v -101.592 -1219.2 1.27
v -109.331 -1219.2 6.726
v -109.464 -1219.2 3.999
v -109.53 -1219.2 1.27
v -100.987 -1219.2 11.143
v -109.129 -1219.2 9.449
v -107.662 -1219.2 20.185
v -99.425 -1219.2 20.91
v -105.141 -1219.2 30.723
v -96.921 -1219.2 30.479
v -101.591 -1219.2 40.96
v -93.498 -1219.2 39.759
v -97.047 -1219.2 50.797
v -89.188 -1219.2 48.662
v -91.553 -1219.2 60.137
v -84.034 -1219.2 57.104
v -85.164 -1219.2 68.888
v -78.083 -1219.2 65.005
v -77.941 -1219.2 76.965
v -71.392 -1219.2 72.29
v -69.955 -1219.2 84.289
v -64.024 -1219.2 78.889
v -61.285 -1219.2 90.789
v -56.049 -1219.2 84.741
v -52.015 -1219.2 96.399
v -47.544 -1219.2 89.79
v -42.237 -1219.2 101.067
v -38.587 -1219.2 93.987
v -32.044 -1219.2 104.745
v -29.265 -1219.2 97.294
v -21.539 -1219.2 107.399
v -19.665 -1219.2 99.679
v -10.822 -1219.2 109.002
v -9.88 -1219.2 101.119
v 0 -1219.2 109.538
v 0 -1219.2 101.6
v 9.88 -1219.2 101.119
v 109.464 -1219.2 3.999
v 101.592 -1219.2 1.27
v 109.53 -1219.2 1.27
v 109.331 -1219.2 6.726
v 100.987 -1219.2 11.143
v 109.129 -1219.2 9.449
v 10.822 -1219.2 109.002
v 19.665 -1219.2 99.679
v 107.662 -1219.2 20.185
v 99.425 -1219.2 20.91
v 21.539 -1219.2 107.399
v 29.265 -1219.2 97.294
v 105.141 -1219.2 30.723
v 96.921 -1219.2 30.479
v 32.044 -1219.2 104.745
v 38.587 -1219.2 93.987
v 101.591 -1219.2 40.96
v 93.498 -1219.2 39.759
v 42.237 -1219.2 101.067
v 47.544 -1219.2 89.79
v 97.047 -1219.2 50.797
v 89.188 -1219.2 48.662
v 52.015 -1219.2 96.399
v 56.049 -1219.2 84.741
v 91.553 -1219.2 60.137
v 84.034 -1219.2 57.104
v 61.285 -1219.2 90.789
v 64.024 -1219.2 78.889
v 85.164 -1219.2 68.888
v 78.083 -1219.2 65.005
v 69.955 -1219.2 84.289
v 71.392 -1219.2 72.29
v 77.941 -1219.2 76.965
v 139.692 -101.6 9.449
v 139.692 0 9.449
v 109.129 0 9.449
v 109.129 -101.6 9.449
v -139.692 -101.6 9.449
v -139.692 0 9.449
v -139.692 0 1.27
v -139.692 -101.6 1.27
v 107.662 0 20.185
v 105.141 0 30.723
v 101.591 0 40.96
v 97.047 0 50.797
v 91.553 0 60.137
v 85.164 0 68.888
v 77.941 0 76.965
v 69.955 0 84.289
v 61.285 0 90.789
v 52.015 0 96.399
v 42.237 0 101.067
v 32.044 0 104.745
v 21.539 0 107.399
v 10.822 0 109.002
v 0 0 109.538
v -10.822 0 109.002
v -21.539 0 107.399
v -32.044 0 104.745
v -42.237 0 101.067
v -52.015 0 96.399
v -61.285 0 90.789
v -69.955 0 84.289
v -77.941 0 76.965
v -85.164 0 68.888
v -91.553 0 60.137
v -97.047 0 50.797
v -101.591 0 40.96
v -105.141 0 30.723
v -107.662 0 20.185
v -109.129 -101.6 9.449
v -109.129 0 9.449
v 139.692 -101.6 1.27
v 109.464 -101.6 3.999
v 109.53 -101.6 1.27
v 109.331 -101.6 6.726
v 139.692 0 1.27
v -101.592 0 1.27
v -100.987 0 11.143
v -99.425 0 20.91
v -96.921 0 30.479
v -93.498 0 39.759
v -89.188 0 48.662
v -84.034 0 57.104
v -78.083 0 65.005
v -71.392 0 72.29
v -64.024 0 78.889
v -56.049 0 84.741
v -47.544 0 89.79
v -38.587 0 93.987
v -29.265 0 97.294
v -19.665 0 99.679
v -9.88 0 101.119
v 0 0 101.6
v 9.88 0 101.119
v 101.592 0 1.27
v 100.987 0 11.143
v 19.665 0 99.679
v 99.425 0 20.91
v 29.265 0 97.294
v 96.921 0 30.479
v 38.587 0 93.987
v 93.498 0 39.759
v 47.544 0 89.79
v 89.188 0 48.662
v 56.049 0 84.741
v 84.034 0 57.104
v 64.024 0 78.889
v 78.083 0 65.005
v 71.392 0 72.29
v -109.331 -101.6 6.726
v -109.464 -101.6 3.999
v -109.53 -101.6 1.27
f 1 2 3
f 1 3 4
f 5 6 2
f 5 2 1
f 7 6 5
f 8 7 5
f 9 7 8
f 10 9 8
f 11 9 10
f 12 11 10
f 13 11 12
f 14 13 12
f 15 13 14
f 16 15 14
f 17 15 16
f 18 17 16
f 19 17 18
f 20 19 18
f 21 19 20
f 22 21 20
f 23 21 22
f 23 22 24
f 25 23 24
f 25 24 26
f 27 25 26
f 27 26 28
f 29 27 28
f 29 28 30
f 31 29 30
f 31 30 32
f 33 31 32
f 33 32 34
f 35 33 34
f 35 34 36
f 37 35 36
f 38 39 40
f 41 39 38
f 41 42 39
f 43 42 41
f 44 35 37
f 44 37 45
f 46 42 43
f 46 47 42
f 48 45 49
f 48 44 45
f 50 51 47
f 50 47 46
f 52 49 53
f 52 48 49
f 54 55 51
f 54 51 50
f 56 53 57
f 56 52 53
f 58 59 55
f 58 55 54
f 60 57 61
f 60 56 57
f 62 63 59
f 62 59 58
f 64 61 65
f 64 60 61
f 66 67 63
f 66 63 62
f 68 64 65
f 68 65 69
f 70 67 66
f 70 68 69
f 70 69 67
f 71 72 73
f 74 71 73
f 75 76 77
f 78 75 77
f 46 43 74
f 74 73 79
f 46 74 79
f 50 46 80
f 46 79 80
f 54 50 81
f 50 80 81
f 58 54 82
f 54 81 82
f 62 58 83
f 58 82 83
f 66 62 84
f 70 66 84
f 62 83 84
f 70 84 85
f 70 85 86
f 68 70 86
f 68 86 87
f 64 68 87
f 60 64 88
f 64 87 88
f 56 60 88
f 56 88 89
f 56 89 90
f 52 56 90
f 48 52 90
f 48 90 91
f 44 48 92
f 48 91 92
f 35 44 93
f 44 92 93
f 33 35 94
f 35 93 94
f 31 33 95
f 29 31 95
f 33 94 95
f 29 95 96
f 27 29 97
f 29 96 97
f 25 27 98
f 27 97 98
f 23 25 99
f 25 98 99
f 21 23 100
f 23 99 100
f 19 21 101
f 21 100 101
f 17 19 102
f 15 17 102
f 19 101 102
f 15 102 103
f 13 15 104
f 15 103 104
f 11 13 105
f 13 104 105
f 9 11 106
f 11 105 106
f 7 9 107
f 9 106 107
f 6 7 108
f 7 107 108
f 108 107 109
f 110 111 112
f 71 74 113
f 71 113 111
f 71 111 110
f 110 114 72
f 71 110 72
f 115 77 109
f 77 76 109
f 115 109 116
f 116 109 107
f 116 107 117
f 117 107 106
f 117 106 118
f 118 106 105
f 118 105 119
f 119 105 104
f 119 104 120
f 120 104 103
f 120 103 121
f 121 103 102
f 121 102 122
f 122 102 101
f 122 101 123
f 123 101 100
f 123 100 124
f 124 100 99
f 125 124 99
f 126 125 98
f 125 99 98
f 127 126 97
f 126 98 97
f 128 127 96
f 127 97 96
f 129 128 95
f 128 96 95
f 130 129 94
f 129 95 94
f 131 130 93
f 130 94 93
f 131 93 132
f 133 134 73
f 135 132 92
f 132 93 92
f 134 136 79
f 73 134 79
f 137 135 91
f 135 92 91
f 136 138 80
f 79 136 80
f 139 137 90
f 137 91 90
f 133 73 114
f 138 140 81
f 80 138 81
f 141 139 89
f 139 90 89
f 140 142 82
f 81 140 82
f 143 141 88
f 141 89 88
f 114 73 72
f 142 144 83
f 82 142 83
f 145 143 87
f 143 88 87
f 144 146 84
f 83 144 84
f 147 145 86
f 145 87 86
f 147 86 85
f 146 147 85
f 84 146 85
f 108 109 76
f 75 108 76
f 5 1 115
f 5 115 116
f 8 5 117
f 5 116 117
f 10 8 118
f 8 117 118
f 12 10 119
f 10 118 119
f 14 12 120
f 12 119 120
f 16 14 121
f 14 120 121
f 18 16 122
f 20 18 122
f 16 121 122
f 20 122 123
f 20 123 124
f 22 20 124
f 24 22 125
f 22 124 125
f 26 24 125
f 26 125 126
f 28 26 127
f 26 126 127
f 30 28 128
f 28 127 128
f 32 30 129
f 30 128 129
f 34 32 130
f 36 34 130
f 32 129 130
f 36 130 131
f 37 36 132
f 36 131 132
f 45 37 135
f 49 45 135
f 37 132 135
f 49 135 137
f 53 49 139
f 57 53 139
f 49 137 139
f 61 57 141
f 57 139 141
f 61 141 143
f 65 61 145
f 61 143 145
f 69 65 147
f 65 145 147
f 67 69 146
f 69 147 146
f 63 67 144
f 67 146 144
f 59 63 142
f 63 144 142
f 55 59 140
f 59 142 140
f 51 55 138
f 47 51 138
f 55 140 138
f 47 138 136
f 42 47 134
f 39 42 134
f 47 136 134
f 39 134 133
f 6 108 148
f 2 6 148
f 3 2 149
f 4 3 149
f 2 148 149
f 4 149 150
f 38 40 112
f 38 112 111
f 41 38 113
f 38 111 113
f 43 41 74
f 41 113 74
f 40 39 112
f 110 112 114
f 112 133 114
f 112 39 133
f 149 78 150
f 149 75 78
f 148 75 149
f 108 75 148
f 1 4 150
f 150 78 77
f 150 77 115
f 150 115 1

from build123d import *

# Parameters (mm, degrees)
F1_DEPTH = 1219.2
F2_DEPTH = 101.6


with BuildPart() as f1:
    # F0 (on Front) → F1 (new body)
    with BuildSketch(Plane.XZ):
        with BuildLine():
            Line((101.592062, 1.27), (109.530137, 1.27))
            ThreePointArc((109.530137, 1.27), (109.406127, 5.363148), (109.129208, 9.4488))
            ThreePointArc((109.129208, 9.4488), (0, 109.5375), (-109.129208, 9.4488))
            ThreePointArc((-109.129208, 9.4488), (-109.406127, 5.363148), (-109.530137, 1.27))
            Line((-109.530137, 1.27), (-101.592062, 1.27))
            ThreePointArc((-101.592062, 1.27), (0, 101.6), (101.592062, 1.27))
        make_face()
    extrude(amount=F1_DEPTH)

    # F0 (on Front) → F2 (join)
    with BuildSketch(Plane.XZ):
        with BuildLine():
            Line((-139.692062, 1.27), (-127, 1.27))
            Line((-127, 1.27), (-109.530137, 1.27))
            ThreePointArc((-109.530137, 1.27), (-109.406127, 5.363148), (-109.129208, 9.4488))
            Line((-109.129208, 9.4488), (-139.692062, 9.4488))
            Line((-139.692062, 9.4488), (-139.692062, 1.27))
        make_face()
        with BuildLine():
            Line((109.530137, 1.27), (127, 1.27))
            Line((127, 1.27), (139.692062, 1.27))
            Line((139.692062, 1.27), (139.692062, 9.4488))
            Line((139.692062, 9.4488), (109.129208, 9.4488))
            ThreePointArc((109.129208, 9.4488), (109.406127, 5.363148), (109.530137, 1.27))
        make_face()
    extrude(amount=F2_DEPTH)


solid = f1.part
